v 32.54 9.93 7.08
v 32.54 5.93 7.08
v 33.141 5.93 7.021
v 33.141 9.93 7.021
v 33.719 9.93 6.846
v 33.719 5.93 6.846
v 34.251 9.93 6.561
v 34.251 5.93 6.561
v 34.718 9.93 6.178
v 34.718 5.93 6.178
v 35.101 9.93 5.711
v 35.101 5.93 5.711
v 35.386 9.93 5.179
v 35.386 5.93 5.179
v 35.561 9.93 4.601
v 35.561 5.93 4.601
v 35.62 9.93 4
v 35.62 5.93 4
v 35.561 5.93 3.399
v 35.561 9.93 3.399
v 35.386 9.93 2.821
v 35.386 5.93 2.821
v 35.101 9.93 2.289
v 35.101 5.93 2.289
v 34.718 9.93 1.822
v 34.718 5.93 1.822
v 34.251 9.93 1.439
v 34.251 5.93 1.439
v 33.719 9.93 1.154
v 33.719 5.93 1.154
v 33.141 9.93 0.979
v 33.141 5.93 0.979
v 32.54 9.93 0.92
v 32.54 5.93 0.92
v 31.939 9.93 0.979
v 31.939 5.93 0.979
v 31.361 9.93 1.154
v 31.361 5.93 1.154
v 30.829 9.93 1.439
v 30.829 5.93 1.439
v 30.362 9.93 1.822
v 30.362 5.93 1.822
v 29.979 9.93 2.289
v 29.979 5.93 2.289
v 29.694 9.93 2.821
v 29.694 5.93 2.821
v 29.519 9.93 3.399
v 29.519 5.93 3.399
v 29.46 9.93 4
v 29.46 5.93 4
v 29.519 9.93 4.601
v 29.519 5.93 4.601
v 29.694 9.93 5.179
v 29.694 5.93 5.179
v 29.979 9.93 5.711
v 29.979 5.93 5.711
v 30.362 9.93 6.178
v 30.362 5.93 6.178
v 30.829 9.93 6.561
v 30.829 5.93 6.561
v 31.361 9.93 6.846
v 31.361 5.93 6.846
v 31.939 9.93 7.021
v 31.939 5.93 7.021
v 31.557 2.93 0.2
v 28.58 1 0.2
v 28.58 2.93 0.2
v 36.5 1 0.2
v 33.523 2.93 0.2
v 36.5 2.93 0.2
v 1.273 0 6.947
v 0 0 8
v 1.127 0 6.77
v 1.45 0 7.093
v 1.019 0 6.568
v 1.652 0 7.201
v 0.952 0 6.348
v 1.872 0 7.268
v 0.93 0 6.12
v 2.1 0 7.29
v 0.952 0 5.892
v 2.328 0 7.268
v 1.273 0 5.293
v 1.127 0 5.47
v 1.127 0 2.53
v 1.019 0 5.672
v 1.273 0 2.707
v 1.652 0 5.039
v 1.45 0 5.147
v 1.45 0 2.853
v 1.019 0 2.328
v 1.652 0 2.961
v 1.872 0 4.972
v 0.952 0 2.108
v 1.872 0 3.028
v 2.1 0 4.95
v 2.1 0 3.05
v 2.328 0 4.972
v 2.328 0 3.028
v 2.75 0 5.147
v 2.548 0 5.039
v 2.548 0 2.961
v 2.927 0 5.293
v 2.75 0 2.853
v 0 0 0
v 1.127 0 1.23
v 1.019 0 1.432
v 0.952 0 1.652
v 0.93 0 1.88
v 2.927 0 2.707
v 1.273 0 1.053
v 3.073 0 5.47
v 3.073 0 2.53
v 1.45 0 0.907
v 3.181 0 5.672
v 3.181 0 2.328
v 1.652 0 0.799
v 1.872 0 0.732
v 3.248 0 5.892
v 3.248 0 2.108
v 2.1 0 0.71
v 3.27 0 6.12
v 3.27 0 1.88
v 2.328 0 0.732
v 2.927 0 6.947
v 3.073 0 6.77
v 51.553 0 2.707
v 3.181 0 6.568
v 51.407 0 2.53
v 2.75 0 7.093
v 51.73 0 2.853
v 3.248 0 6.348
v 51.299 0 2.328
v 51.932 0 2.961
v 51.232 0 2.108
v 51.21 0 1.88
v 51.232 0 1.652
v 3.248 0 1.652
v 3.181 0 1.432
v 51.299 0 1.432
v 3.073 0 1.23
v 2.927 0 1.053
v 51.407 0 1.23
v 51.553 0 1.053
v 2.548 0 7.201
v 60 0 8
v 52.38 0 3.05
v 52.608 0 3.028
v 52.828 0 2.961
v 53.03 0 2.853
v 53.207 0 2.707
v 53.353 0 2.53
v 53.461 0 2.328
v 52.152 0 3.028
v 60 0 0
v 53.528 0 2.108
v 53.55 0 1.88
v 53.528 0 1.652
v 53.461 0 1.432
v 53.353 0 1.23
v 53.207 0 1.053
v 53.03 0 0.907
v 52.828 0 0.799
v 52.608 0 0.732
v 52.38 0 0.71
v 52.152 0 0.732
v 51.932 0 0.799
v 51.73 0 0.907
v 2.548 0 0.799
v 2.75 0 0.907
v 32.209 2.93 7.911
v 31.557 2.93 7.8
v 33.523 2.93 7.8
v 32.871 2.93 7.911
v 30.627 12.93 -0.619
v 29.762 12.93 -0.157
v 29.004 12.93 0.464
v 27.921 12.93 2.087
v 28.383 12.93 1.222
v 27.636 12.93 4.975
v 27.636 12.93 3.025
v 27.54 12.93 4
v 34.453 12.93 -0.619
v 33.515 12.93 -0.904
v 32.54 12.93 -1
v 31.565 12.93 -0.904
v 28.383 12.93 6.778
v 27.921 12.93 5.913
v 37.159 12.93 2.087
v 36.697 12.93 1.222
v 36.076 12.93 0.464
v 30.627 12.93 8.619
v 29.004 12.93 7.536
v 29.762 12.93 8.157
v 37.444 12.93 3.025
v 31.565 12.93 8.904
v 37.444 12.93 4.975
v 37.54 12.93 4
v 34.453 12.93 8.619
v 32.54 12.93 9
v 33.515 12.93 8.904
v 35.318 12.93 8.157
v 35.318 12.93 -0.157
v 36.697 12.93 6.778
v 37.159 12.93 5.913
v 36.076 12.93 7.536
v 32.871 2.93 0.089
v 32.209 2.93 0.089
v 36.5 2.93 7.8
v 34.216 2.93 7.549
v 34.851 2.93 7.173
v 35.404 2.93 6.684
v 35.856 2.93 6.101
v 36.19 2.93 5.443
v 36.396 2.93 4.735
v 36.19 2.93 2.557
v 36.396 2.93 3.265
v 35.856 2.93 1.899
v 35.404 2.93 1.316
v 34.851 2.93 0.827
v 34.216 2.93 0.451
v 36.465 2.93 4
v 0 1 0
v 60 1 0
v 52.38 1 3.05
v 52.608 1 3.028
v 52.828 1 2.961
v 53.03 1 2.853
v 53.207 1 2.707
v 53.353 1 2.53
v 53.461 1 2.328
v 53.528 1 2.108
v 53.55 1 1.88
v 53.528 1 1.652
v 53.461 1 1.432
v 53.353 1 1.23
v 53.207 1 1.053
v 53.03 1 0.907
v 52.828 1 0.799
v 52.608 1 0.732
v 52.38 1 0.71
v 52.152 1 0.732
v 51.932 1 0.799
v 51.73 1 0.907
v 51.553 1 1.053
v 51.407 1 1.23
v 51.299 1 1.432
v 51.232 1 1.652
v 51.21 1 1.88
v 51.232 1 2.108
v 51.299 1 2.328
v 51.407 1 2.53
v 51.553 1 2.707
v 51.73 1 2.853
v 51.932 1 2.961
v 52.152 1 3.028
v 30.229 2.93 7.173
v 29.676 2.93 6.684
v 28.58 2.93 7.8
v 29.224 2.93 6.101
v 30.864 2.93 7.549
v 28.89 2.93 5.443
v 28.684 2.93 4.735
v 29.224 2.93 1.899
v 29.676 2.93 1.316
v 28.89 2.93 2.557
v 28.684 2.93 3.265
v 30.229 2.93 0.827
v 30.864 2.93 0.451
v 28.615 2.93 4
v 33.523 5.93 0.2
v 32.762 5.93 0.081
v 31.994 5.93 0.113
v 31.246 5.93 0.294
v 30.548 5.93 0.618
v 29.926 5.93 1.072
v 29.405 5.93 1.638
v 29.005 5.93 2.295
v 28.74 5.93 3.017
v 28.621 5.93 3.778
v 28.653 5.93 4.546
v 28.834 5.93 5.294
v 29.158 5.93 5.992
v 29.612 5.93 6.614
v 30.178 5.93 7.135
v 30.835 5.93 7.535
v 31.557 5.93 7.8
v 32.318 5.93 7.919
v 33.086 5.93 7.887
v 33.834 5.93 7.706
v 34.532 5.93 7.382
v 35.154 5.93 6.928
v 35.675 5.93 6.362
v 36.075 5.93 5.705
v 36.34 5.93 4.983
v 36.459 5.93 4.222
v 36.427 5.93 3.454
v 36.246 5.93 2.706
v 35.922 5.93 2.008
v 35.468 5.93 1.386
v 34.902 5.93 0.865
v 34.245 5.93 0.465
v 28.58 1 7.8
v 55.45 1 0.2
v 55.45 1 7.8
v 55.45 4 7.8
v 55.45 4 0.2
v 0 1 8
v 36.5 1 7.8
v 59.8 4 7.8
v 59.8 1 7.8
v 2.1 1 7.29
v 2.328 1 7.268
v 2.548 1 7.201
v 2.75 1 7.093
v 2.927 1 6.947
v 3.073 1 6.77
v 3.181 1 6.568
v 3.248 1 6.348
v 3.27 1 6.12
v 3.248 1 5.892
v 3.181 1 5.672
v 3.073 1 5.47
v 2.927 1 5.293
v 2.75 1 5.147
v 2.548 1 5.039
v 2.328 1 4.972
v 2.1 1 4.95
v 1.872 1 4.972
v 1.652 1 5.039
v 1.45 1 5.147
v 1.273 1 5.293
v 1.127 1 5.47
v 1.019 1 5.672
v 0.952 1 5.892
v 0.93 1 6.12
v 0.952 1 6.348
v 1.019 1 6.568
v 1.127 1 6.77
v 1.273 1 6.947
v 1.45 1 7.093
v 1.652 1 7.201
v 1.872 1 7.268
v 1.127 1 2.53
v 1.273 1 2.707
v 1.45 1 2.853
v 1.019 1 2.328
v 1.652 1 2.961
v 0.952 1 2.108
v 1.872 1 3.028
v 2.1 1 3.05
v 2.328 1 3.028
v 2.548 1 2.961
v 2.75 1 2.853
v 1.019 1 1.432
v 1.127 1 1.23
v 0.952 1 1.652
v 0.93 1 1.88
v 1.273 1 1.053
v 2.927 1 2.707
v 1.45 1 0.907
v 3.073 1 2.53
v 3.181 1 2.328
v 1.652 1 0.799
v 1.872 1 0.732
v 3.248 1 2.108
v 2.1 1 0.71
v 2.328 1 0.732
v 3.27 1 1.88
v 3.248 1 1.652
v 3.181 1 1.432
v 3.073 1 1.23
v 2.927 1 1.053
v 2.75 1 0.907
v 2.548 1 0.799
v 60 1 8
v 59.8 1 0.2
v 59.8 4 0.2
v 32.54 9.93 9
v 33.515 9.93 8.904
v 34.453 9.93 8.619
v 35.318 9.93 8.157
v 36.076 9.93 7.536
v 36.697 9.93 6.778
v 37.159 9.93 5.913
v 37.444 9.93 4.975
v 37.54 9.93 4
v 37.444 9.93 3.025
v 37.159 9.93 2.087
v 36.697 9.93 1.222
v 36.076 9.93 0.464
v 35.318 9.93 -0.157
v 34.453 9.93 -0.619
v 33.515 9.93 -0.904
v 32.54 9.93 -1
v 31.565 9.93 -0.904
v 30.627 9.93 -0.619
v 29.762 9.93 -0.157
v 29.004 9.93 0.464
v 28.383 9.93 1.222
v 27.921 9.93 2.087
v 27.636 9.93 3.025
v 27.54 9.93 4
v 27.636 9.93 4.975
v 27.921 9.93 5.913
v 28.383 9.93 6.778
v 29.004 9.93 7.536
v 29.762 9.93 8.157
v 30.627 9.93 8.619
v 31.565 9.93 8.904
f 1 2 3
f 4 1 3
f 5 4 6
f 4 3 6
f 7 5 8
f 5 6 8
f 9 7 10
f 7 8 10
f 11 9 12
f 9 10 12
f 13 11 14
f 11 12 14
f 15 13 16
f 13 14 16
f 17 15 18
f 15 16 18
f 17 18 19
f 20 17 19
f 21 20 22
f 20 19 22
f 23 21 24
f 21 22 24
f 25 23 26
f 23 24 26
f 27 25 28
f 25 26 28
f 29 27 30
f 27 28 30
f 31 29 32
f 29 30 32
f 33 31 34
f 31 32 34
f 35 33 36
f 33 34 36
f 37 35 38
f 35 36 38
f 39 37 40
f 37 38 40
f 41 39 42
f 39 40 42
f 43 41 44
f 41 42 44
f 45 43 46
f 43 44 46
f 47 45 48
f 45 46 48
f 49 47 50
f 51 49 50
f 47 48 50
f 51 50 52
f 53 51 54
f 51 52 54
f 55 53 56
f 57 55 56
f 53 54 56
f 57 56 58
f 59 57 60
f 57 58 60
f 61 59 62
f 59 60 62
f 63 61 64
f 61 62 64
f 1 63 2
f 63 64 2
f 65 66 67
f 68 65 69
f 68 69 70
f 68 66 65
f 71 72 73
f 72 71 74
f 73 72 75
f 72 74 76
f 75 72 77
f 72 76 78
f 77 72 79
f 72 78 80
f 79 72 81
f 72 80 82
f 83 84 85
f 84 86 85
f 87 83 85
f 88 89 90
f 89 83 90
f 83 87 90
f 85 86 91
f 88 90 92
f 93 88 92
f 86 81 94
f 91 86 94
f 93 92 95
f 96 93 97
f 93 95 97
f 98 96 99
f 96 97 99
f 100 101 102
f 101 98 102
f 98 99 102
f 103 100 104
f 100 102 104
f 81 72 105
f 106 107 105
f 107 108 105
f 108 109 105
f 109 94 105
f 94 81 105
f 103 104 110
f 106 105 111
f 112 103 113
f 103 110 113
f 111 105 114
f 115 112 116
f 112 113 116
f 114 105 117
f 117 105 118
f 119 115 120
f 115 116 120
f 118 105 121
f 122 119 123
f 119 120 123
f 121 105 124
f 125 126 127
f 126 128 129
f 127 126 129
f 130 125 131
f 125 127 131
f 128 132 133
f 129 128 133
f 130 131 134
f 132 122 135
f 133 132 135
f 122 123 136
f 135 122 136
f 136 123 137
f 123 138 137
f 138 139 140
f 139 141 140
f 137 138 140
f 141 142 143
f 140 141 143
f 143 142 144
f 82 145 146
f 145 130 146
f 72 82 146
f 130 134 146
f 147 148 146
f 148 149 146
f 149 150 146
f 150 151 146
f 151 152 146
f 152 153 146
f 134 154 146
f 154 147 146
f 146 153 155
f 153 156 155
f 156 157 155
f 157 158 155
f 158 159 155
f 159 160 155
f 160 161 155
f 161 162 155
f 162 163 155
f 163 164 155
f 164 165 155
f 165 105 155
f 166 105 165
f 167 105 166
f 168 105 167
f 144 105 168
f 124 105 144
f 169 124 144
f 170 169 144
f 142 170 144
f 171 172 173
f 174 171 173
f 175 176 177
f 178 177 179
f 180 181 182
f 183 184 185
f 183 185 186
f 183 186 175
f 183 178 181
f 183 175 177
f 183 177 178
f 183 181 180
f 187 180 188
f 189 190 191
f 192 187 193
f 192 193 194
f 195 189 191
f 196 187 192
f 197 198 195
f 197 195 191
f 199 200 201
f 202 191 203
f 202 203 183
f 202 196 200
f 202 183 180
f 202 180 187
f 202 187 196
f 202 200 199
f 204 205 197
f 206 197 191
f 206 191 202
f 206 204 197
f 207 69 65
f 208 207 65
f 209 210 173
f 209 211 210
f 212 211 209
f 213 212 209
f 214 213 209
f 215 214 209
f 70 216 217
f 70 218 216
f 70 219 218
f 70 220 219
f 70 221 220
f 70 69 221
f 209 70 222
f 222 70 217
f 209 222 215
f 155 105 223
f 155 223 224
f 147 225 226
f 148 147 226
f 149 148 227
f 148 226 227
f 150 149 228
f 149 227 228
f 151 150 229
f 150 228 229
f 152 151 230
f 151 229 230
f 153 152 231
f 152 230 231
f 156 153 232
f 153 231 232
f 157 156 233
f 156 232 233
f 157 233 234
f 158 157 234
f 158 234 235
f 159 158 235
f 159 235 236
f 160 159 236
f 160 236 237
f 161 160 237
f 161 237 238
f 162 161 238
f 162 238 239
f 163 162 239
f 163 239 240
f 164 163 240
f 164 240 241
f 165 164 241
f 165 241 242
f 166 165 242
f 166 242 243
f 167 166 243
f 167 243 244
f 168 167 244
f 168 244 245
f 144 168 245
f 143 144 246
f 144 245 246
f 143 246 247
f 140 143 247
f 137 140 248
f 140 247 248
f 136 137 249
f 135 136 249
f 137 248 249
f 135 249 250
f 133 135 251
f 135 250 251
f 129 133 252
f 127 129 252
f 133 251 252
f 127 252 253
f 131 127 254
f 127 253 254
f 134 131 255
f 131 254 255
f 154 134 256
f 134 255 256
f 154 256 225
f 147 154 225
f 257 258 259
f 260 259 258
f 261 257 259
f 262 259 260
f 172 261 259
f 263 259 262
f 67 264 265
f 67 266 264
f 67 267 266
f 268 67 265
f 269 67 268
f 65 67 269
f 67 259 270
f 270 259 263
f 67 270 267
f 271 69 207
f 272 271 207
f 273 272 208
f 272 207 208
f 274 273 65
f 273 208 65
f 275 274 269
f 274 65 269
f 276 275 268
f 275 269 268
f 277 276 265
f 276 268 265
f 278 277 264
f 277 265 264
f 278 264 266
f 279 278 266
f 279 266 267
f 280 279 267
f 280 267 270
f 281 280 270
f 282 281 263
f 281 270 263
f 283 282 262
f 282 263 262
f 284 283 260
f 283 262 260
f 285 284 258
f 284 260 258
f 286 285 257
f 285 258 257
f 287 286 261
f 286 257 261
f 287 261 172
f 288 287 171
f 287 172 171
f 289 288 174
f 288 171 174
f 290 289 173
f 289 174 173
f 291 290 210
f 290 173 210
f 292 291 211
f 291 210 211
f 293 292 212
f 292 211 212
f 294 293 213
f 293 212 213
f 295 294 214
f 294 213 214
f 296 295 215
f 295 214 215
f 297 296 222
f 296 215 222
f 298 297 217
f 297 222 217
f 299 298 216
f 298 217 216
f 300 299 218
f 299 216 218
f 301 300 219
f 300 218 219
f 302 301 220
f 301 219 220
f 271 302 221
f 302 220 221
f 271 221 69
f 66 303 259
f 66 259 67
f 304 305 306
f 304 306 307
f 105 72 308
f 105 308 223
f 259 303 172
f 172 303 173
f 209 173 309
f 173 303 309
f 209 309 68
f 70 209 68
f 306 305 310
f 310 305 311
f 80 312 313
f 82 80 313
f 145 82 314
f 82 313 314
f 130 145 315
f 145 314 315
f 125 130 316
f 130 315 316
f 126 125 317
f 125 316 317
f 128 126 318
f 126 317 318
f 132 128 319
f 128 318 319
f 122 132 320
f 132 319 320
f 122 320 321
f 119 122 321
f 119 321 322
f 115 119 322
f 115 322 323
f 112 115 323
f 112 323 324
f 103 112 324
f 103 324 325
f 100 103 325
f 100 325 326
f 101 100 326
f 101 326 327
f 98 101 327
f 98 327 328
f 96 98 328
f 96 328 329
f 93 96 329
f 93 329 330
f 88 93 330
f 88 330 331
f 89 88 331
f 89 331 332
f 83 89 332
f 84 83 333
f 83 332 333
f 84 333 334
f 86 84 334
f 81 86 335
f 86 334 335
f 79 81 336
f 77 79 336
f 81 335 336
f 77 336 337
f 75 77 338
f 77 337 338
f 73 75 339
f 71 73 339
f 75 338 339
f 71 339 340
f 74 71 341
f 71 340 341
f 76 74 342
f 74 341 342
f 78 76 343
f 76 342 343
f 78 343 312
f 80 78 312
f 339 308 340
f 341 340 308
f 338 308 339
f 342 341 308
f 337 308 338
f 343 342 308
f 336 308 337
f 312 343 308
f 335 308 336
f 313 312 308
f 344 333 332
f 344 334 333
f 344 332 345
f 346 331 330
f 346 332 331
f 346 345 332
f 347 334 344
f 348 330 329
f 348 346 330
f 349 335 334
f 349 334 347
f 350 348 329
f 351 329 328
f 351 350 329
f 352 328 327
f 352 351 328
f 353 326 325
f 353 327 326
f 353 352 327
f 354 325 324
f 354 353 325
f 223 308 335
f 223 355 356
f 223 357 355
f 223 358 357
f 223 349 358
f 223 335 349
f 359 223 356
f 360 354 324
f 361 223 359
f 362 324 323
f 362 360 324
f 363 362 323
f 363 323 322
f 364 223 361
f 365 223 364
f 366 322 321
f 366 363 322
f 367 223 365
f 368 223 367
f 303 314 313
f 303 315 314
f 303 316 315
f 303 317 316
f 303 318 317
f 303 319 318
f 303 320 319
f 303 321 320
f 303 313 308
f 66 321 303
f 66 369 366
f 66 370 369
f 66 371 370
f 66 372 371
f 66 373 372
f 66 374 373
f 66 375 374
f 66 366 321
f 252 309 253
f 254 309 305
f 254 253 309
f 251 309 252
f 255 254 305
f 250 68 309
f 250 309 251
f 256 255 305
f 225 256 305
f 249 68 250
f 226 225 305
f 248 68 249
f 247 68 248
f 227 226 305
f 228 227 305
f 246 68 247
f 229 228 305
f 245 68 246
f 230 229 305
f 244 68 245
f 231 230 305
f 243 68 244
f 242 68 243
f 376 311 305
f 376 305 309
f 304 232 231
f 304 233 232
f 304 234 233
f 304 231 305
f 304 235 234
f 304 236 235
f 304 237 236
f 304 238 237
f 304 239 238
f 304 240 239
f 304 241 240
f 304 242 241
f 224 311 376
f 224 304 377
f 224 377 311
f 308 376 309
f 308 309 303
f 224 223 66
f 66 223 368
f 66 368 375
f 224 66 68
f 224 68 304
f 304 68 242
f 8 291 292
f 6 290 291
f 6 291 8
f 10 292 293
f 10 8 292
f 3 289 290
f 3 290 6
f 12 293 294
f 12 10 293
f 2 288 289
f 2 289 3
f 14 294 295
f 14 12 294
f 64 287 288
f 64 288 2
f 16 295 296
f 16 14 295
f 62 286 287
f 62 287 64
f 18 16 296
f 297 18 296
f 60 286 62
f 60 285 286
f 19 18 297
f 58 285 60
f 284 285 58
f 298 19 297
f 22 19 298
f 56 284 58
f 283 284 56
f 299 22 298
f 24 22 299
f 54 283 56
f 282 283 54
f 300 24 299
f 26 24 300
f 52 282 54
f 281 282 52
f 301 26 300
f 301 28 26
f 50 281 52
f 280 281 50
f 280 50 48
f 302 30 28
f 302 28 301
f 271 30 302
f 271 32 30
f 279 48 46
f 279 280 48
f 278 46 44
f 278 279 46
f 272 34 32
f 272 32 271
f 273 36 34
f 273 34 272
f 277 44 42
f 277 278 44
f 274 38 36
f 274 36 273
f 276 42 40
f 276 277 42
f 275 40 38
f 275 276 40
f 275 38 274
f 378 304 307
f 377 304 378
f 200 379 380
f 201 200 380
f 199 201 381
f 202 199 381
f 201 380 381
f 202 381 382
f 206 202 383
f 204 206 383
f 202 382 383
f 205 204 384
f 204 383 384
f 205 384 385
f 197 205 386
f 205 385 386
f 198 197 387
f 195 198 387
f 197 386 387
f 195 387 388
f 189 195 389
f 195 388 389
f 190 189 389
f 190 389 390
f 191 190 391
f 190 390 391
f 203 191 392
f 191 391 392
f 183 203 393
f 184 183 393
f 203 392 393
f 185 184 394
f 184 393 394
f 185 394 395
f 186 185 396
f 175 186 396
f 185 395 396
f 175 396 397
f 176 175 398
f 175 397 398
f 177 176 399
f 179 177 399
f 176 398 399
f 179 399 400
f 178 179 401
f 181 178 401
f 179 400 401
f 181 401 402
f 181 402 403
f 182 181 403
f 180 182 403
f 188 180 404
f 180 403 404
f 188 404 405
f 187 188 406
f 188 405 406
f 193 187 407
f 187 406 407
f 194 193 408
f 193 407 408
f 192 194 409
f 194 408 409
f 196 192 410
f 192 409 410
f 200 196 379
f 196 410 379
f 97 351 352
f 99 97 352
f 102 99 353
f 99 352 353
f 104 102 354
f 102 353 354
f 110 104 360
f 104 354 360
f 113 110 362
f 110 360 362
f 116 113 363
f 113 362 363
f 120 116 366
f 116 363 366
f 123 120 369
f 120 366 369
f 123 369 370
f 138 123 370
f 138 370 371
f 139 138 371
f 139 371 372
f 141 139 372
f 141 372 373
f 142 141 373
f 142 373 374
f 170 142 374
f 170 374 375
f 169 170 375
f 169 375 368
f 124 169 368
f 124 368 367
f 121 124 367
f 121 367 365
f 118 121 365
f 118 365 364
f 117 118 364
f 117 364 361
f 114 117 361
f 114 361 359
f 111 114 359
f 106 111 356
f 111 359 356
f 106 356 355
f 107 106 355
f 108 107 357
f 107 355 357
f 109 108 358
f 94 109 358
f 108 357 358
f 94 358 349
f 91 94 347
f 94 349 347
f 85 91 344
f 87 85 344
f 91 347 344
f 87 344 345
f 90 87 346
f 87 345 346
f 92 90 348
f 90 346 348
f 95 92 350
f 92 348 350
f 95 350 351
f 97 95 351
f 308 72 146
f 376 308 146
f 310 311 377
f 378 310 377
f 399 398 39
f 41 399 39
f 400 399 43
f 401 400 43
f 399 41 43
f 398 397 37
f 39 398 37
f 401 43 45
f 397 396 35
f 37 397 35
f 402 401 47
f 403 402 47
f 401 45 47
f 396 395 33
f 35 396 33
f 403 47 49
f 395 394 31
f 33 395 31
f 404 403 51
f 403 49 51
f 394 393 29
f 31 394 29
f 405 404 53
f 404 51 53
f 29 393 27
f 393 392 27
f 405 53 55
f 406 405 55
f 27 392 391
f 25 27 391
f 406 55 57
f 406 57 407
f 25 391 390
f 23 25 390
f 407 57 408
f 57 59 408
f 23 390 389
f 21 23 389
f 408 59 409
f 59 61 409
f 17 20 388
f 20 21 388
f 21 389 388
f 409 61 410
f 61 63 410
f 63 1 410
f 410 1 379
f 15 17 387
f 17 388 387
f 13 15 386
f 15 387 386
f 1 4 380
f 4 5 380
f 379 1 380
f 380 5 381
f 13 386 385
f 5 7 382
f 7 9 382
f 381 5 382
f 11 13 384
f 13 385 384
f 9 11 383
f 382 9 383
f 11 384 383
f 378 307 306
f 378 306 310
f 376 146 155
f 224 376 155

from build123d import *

# Parameters (mm, degrees)
SKETCH1_W           = 60
SKETCH1_H           = 8
BOSS_EXTRUDE1_DEPTH = 1
SKETCH2_W           = 4.35
SKETCH2_H           = 7.6
BOSS_EXTRUDE2_DEPTH = 3
SKETCH3_R           = 1.17
CUT_EXTRUDE1_DEPTH  = 3
SKETCH4_W           = 7.92
SKETCH4_H           = 7.6
BOSS_EXTRUDE3_DEPTH = 1.93
SKETCH5_R           = 3.925
BOSS_EXTRUDE4_DEPTH = 3
SKETCH6_R           = 3.08
BOSS_EXTRUDE5_DEPTH = 4
SKETCH7_R           = 5
BOSS_EXTRUDE6_DEPTH = 3


with BuildPart() as part:
    # Sketch1 → Boss-Extrude1 (new body)
    with BuildSketch(Plane(origin=(0, 0, 0), x_dir=(1, 0, 0), z_dir=(0, 1, 0))):
        with Locations((30, -4)):
            Rectangle(SKETCH1_W, SKETCH1_H)
    extrude(amount=BOSS_EXTRUDE1_DEPTH)

    # Sketch2 → Boss-Extrude2 (add)
    with BuildSketch(Plane(origin=(0, 1, 0), x_dir=(1, 0, 0), z_dir=(0, 1, 0))):
        with Locations((57.625, -4)):
            Rectangle(SKETCH2_W, SKETCH2_H)
    extrude(amount=BOSS_EXTRUDE2_DEPTH)

    # Sketch3 → Cut-Extrude1 (cut)
    with BuildSketch(Plane(origin=(0, 1, 0), x_dir=(1, 0, 0), z_dir=(0, 1, 0))):
        with Locations(Location((52.38, -1.88, 0), (0, 0, 270))):
            Circle(SKETCH3_R)
        with Locations(Location((2.1, -6.12, 0), (0, 0, 270))):
            Circle(SKETCH3_R)
        with Locations(Location((2.1, -1.88, 0), (0, 0, 270))):
            Circle(SKETCH3_R)
    extrude(amount=-CUT_EXTRUDE1_DEPTH, mode=Mode.SUBTRACT)

    # Sketch4 → Boss-Extrude3 (add)
    with BuildSketch(Plane(origin=(0, 1, 0), x_dir=(1, 0, 0), z_dir=(0, 1, 0))):
        with Locations((32.54, -4)):
            Rectangle(SKETCH4_W, SKETCH4_H)
    extrude(amount=BOSS_EXTRUDE3_DEPTH)

    # Sketch5 → Boss-Extrude4 (add)
    with BuildSketch(Plane(origin=(0, 2.93, 0), x_dir=(1, 0, 0), z_dir=(0, 1, 0))):
        with Locations(Location((32.54, -4, 0), (0, 0, 75.50119591))):
            Circle(SKETCH5_R)
    extrude(amount=BOSS_EXTRUDE4_DEPTH)

    # Sketch6 → Boss-Extrude5 (add)
    with BuildSketch(Plane(origin=(0, 5.93, 0), x_dir=(1, 0, 0), z_dir=(0, 1, 0))):
        with Locations(Location((32.54, -4, 0), (0, 0, 270))):
            Circle(SKETCH6_R)
    extrude(amount=BOSS_EXTRUDE5_DEPTH)

    # Sketch7 → Boss-Extrude6 (add)
    with BuildSketch(Plane(origin=(0, 9.93, 0), x_dir=(1, 0, 0), z_dir=(0, 1, 0))):
        with Locations(Location((32.54, -4, 0), (0, 0, 270))):
            Circle(SKETCH7_R)
    extrude(amount=BOSS_EXTRUDE6_DEPTH)


solid = part.part
